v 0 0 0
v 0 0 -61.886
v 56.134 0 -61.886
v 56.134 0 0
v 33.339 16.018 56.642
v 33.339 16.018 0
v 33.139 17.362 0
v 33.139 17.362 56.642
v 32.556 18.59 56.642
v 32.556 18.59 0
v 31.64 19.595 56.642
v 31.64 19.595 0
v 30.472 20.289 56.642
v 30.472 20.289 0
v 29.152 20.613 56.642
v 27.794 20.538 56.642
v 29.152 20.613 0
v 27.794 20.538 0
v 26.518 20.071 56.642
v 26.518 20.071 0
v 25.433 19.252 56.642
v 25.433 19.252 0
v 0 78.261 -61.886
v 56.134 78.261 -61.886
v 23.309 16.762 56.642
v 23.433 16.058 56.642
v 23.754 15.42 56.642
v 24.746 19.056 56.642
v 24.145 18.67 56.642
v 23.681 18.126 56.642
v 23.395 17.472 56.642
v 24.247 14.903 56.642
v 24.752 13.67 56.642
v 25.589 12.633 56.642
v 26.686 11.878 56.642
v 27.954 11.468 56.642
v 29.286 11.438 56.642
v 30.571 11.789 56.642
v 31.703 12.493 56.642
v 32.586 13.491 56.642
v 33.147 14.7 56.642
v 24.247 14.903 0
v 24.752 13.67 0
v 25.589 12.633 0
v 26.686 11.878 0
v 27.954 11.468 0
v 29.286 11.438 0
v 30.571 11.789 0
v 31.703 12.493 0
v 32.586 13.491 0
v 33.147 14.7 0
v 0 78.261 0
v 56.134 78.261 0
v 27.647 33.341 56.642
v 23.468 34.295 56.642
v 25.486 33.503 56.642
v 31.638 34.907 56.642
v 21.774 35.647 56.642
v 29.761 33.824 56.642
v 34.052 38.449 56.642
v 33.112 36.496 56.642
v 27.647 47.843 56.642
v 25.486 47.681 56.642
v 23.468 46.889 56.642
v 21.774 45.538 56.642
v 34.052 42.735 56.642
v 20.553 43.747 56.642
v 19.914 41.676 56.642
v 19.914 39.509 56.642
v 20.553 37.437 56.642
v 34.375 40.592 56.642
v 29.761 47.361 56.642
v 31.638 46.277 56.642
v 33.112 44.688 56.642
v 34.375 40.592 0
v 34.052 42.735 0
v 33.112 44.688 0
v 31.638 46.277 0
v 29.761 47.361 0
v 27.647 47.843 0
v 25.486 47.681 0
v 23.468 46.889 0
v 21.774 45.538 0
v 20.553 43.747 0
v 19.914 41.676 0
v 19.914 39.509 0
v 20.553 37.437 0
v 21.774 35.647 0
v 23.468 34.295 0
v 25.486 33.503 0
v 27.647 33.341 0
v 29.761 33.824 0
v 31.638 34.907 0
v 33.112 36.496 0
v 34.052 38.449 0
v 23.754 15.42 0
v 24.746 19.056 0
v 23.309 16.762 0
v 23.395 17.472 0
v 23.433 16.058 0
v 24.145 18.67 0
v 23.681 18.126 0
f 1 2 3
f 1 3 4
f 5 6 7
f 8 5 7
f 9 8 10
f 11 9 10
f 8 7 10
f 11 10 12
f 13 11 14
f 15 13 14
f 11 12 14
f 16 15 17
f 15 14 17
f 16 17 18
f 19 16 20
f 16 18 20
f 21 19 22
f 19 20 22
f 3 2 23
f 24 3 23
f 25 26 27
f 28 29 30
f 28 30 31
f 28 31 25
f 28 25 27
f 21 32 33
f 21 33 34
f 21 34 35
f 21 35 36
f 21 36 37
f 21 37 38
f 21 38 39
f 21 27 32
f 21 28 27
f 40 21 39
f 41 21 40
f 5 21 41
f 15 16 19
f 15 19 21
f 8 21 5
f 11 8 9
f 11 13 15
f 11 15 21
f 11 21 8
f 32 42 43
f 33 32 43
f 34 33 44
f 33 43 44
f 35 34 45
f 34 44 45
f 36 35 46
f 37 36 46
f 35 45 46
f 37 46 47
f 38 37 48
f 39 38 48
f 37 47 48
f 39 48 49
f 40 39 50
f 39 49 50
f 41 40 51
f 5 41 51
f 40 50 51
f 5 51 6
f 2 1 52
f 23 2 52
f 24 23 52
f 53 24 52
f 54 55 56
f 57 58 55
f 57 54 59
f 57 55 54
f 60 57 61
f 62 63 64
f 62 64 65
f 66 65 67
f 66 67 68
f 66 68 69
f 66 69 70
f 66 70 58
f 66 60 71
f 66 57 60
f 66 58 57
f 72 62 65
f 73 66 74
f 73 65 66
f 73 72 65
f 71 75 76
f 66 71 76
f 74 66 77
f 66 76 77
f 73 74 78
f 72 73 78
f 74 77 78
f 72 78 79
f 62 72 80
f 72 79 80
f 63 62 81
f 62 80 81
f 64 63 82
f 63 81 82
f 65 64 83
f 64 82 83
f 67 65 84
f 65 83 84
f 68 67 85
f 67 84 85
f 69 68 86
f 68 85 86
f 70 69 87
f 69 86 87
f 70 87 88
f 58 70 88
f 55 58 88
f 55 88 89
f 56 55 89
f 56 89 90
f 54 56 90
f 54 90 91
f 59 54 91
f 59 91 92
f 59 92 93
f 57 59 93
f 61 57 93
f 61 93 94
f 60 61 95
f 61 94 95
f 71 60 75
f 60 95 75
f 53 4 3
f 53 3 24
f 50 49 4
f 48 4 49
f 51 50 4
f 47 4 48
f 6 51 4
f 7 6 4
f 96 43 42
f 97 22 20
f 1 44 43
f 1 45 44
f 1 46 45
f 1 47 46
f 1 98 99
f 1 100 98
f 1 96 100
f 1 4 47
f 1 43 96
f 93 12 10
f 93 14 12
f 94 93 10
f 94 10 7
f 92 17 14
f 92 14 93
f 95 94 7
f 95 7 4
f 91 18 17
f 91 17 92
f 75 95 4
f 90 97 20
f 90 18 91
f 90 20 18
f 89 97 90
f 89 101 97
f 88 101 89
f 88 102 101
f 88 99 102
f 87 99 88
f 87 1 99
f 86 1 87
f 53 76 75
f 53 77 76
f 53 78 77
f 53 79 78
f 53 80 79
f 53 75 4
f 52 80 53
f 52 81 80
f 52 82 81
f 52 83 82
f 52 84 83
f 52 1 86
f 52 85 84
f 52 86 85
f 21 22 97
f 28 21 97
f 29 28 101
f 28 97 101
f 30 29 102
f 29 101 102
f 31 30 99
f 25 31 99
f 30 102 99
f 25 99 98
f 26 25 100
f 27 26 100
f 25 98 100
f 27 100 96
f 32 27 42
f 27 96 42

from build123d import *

# Parameters (mm, degrees)
F0_W     = 78.2610476017
F0_H     = 61.8856586516
F1_DEPTH = 56.134
F4_R     = 7.271205843
F5_DEPTH = 56.642


# Not quite as in the source:
# - the program builds the solid bodies; features that only make, move or delete a surface that nothing else refers to are left out


with BuildPart() as f1:
    # F0 (on Right) → F1 (new body)
    with BuildSketch(Plane.YZ):
        with Locations((39.1305238008, -30.9428293258)):
            Rectangle(F0_W, F0_H)
    extrude(amount=F1_DEPTH)

    # F4 (on face) → F5 (join)
    with BuildSketch(Plane.XY):
        with Locations((27.1040890366, 40.5922196805)):
            Circle(F4_R)
        with BuildLine():
            ThreePointArc((24.2466891936, 14.9025116275), (26.8248957449, 14.6298549046), (28.1992270717, 16.8281961232))
            ThreePointArc((28.1992270717, 16.8281961232), (27.3655770879, 18.6672690129), (25.4330261647, 19.2524256742))
            ThreePointArc((25.4330261647, 19.2524256742), (24.2724174076, 17.232224668), (24.2466891936, 14.9025116275))
        make_face()
        with BuildLine():
            ThreePointArc((25.4330261647, 19.2524256742), (27.3655770879, 18.6672690129), (28.1992270717, 16.8281961232))
            ThreePointArc((28.1992270717, 16.8281961232), (26.8248957449, 14.6298549046), (24.2466891936, 14.9025116275))
            ThreePointArc((24.2466891936, 14.9025116275), (29.2863202966, 11.4378625234), (33.3389067896, 16.0180609673))
            ThreePointArc((33.3389067896, 16.0180609673), (30.4716460582, 20.2890111986), (25.4330261647, 19.2524256742))
        make_face()
        with BuildLine():
            ThreePointArc((24.2466891936, 14.9025116275), (24.2724174076, 17.232224668), (25.4330261647, 19.2524256742))
            ThreePointArc((25.4330261647, 19.2524256742), (23.394656757, 17.4716132859), (24.2466891936, 14.9025116275))
        make_face()
    extrude(amount=F5_DEPTH)


solid = f1.part
